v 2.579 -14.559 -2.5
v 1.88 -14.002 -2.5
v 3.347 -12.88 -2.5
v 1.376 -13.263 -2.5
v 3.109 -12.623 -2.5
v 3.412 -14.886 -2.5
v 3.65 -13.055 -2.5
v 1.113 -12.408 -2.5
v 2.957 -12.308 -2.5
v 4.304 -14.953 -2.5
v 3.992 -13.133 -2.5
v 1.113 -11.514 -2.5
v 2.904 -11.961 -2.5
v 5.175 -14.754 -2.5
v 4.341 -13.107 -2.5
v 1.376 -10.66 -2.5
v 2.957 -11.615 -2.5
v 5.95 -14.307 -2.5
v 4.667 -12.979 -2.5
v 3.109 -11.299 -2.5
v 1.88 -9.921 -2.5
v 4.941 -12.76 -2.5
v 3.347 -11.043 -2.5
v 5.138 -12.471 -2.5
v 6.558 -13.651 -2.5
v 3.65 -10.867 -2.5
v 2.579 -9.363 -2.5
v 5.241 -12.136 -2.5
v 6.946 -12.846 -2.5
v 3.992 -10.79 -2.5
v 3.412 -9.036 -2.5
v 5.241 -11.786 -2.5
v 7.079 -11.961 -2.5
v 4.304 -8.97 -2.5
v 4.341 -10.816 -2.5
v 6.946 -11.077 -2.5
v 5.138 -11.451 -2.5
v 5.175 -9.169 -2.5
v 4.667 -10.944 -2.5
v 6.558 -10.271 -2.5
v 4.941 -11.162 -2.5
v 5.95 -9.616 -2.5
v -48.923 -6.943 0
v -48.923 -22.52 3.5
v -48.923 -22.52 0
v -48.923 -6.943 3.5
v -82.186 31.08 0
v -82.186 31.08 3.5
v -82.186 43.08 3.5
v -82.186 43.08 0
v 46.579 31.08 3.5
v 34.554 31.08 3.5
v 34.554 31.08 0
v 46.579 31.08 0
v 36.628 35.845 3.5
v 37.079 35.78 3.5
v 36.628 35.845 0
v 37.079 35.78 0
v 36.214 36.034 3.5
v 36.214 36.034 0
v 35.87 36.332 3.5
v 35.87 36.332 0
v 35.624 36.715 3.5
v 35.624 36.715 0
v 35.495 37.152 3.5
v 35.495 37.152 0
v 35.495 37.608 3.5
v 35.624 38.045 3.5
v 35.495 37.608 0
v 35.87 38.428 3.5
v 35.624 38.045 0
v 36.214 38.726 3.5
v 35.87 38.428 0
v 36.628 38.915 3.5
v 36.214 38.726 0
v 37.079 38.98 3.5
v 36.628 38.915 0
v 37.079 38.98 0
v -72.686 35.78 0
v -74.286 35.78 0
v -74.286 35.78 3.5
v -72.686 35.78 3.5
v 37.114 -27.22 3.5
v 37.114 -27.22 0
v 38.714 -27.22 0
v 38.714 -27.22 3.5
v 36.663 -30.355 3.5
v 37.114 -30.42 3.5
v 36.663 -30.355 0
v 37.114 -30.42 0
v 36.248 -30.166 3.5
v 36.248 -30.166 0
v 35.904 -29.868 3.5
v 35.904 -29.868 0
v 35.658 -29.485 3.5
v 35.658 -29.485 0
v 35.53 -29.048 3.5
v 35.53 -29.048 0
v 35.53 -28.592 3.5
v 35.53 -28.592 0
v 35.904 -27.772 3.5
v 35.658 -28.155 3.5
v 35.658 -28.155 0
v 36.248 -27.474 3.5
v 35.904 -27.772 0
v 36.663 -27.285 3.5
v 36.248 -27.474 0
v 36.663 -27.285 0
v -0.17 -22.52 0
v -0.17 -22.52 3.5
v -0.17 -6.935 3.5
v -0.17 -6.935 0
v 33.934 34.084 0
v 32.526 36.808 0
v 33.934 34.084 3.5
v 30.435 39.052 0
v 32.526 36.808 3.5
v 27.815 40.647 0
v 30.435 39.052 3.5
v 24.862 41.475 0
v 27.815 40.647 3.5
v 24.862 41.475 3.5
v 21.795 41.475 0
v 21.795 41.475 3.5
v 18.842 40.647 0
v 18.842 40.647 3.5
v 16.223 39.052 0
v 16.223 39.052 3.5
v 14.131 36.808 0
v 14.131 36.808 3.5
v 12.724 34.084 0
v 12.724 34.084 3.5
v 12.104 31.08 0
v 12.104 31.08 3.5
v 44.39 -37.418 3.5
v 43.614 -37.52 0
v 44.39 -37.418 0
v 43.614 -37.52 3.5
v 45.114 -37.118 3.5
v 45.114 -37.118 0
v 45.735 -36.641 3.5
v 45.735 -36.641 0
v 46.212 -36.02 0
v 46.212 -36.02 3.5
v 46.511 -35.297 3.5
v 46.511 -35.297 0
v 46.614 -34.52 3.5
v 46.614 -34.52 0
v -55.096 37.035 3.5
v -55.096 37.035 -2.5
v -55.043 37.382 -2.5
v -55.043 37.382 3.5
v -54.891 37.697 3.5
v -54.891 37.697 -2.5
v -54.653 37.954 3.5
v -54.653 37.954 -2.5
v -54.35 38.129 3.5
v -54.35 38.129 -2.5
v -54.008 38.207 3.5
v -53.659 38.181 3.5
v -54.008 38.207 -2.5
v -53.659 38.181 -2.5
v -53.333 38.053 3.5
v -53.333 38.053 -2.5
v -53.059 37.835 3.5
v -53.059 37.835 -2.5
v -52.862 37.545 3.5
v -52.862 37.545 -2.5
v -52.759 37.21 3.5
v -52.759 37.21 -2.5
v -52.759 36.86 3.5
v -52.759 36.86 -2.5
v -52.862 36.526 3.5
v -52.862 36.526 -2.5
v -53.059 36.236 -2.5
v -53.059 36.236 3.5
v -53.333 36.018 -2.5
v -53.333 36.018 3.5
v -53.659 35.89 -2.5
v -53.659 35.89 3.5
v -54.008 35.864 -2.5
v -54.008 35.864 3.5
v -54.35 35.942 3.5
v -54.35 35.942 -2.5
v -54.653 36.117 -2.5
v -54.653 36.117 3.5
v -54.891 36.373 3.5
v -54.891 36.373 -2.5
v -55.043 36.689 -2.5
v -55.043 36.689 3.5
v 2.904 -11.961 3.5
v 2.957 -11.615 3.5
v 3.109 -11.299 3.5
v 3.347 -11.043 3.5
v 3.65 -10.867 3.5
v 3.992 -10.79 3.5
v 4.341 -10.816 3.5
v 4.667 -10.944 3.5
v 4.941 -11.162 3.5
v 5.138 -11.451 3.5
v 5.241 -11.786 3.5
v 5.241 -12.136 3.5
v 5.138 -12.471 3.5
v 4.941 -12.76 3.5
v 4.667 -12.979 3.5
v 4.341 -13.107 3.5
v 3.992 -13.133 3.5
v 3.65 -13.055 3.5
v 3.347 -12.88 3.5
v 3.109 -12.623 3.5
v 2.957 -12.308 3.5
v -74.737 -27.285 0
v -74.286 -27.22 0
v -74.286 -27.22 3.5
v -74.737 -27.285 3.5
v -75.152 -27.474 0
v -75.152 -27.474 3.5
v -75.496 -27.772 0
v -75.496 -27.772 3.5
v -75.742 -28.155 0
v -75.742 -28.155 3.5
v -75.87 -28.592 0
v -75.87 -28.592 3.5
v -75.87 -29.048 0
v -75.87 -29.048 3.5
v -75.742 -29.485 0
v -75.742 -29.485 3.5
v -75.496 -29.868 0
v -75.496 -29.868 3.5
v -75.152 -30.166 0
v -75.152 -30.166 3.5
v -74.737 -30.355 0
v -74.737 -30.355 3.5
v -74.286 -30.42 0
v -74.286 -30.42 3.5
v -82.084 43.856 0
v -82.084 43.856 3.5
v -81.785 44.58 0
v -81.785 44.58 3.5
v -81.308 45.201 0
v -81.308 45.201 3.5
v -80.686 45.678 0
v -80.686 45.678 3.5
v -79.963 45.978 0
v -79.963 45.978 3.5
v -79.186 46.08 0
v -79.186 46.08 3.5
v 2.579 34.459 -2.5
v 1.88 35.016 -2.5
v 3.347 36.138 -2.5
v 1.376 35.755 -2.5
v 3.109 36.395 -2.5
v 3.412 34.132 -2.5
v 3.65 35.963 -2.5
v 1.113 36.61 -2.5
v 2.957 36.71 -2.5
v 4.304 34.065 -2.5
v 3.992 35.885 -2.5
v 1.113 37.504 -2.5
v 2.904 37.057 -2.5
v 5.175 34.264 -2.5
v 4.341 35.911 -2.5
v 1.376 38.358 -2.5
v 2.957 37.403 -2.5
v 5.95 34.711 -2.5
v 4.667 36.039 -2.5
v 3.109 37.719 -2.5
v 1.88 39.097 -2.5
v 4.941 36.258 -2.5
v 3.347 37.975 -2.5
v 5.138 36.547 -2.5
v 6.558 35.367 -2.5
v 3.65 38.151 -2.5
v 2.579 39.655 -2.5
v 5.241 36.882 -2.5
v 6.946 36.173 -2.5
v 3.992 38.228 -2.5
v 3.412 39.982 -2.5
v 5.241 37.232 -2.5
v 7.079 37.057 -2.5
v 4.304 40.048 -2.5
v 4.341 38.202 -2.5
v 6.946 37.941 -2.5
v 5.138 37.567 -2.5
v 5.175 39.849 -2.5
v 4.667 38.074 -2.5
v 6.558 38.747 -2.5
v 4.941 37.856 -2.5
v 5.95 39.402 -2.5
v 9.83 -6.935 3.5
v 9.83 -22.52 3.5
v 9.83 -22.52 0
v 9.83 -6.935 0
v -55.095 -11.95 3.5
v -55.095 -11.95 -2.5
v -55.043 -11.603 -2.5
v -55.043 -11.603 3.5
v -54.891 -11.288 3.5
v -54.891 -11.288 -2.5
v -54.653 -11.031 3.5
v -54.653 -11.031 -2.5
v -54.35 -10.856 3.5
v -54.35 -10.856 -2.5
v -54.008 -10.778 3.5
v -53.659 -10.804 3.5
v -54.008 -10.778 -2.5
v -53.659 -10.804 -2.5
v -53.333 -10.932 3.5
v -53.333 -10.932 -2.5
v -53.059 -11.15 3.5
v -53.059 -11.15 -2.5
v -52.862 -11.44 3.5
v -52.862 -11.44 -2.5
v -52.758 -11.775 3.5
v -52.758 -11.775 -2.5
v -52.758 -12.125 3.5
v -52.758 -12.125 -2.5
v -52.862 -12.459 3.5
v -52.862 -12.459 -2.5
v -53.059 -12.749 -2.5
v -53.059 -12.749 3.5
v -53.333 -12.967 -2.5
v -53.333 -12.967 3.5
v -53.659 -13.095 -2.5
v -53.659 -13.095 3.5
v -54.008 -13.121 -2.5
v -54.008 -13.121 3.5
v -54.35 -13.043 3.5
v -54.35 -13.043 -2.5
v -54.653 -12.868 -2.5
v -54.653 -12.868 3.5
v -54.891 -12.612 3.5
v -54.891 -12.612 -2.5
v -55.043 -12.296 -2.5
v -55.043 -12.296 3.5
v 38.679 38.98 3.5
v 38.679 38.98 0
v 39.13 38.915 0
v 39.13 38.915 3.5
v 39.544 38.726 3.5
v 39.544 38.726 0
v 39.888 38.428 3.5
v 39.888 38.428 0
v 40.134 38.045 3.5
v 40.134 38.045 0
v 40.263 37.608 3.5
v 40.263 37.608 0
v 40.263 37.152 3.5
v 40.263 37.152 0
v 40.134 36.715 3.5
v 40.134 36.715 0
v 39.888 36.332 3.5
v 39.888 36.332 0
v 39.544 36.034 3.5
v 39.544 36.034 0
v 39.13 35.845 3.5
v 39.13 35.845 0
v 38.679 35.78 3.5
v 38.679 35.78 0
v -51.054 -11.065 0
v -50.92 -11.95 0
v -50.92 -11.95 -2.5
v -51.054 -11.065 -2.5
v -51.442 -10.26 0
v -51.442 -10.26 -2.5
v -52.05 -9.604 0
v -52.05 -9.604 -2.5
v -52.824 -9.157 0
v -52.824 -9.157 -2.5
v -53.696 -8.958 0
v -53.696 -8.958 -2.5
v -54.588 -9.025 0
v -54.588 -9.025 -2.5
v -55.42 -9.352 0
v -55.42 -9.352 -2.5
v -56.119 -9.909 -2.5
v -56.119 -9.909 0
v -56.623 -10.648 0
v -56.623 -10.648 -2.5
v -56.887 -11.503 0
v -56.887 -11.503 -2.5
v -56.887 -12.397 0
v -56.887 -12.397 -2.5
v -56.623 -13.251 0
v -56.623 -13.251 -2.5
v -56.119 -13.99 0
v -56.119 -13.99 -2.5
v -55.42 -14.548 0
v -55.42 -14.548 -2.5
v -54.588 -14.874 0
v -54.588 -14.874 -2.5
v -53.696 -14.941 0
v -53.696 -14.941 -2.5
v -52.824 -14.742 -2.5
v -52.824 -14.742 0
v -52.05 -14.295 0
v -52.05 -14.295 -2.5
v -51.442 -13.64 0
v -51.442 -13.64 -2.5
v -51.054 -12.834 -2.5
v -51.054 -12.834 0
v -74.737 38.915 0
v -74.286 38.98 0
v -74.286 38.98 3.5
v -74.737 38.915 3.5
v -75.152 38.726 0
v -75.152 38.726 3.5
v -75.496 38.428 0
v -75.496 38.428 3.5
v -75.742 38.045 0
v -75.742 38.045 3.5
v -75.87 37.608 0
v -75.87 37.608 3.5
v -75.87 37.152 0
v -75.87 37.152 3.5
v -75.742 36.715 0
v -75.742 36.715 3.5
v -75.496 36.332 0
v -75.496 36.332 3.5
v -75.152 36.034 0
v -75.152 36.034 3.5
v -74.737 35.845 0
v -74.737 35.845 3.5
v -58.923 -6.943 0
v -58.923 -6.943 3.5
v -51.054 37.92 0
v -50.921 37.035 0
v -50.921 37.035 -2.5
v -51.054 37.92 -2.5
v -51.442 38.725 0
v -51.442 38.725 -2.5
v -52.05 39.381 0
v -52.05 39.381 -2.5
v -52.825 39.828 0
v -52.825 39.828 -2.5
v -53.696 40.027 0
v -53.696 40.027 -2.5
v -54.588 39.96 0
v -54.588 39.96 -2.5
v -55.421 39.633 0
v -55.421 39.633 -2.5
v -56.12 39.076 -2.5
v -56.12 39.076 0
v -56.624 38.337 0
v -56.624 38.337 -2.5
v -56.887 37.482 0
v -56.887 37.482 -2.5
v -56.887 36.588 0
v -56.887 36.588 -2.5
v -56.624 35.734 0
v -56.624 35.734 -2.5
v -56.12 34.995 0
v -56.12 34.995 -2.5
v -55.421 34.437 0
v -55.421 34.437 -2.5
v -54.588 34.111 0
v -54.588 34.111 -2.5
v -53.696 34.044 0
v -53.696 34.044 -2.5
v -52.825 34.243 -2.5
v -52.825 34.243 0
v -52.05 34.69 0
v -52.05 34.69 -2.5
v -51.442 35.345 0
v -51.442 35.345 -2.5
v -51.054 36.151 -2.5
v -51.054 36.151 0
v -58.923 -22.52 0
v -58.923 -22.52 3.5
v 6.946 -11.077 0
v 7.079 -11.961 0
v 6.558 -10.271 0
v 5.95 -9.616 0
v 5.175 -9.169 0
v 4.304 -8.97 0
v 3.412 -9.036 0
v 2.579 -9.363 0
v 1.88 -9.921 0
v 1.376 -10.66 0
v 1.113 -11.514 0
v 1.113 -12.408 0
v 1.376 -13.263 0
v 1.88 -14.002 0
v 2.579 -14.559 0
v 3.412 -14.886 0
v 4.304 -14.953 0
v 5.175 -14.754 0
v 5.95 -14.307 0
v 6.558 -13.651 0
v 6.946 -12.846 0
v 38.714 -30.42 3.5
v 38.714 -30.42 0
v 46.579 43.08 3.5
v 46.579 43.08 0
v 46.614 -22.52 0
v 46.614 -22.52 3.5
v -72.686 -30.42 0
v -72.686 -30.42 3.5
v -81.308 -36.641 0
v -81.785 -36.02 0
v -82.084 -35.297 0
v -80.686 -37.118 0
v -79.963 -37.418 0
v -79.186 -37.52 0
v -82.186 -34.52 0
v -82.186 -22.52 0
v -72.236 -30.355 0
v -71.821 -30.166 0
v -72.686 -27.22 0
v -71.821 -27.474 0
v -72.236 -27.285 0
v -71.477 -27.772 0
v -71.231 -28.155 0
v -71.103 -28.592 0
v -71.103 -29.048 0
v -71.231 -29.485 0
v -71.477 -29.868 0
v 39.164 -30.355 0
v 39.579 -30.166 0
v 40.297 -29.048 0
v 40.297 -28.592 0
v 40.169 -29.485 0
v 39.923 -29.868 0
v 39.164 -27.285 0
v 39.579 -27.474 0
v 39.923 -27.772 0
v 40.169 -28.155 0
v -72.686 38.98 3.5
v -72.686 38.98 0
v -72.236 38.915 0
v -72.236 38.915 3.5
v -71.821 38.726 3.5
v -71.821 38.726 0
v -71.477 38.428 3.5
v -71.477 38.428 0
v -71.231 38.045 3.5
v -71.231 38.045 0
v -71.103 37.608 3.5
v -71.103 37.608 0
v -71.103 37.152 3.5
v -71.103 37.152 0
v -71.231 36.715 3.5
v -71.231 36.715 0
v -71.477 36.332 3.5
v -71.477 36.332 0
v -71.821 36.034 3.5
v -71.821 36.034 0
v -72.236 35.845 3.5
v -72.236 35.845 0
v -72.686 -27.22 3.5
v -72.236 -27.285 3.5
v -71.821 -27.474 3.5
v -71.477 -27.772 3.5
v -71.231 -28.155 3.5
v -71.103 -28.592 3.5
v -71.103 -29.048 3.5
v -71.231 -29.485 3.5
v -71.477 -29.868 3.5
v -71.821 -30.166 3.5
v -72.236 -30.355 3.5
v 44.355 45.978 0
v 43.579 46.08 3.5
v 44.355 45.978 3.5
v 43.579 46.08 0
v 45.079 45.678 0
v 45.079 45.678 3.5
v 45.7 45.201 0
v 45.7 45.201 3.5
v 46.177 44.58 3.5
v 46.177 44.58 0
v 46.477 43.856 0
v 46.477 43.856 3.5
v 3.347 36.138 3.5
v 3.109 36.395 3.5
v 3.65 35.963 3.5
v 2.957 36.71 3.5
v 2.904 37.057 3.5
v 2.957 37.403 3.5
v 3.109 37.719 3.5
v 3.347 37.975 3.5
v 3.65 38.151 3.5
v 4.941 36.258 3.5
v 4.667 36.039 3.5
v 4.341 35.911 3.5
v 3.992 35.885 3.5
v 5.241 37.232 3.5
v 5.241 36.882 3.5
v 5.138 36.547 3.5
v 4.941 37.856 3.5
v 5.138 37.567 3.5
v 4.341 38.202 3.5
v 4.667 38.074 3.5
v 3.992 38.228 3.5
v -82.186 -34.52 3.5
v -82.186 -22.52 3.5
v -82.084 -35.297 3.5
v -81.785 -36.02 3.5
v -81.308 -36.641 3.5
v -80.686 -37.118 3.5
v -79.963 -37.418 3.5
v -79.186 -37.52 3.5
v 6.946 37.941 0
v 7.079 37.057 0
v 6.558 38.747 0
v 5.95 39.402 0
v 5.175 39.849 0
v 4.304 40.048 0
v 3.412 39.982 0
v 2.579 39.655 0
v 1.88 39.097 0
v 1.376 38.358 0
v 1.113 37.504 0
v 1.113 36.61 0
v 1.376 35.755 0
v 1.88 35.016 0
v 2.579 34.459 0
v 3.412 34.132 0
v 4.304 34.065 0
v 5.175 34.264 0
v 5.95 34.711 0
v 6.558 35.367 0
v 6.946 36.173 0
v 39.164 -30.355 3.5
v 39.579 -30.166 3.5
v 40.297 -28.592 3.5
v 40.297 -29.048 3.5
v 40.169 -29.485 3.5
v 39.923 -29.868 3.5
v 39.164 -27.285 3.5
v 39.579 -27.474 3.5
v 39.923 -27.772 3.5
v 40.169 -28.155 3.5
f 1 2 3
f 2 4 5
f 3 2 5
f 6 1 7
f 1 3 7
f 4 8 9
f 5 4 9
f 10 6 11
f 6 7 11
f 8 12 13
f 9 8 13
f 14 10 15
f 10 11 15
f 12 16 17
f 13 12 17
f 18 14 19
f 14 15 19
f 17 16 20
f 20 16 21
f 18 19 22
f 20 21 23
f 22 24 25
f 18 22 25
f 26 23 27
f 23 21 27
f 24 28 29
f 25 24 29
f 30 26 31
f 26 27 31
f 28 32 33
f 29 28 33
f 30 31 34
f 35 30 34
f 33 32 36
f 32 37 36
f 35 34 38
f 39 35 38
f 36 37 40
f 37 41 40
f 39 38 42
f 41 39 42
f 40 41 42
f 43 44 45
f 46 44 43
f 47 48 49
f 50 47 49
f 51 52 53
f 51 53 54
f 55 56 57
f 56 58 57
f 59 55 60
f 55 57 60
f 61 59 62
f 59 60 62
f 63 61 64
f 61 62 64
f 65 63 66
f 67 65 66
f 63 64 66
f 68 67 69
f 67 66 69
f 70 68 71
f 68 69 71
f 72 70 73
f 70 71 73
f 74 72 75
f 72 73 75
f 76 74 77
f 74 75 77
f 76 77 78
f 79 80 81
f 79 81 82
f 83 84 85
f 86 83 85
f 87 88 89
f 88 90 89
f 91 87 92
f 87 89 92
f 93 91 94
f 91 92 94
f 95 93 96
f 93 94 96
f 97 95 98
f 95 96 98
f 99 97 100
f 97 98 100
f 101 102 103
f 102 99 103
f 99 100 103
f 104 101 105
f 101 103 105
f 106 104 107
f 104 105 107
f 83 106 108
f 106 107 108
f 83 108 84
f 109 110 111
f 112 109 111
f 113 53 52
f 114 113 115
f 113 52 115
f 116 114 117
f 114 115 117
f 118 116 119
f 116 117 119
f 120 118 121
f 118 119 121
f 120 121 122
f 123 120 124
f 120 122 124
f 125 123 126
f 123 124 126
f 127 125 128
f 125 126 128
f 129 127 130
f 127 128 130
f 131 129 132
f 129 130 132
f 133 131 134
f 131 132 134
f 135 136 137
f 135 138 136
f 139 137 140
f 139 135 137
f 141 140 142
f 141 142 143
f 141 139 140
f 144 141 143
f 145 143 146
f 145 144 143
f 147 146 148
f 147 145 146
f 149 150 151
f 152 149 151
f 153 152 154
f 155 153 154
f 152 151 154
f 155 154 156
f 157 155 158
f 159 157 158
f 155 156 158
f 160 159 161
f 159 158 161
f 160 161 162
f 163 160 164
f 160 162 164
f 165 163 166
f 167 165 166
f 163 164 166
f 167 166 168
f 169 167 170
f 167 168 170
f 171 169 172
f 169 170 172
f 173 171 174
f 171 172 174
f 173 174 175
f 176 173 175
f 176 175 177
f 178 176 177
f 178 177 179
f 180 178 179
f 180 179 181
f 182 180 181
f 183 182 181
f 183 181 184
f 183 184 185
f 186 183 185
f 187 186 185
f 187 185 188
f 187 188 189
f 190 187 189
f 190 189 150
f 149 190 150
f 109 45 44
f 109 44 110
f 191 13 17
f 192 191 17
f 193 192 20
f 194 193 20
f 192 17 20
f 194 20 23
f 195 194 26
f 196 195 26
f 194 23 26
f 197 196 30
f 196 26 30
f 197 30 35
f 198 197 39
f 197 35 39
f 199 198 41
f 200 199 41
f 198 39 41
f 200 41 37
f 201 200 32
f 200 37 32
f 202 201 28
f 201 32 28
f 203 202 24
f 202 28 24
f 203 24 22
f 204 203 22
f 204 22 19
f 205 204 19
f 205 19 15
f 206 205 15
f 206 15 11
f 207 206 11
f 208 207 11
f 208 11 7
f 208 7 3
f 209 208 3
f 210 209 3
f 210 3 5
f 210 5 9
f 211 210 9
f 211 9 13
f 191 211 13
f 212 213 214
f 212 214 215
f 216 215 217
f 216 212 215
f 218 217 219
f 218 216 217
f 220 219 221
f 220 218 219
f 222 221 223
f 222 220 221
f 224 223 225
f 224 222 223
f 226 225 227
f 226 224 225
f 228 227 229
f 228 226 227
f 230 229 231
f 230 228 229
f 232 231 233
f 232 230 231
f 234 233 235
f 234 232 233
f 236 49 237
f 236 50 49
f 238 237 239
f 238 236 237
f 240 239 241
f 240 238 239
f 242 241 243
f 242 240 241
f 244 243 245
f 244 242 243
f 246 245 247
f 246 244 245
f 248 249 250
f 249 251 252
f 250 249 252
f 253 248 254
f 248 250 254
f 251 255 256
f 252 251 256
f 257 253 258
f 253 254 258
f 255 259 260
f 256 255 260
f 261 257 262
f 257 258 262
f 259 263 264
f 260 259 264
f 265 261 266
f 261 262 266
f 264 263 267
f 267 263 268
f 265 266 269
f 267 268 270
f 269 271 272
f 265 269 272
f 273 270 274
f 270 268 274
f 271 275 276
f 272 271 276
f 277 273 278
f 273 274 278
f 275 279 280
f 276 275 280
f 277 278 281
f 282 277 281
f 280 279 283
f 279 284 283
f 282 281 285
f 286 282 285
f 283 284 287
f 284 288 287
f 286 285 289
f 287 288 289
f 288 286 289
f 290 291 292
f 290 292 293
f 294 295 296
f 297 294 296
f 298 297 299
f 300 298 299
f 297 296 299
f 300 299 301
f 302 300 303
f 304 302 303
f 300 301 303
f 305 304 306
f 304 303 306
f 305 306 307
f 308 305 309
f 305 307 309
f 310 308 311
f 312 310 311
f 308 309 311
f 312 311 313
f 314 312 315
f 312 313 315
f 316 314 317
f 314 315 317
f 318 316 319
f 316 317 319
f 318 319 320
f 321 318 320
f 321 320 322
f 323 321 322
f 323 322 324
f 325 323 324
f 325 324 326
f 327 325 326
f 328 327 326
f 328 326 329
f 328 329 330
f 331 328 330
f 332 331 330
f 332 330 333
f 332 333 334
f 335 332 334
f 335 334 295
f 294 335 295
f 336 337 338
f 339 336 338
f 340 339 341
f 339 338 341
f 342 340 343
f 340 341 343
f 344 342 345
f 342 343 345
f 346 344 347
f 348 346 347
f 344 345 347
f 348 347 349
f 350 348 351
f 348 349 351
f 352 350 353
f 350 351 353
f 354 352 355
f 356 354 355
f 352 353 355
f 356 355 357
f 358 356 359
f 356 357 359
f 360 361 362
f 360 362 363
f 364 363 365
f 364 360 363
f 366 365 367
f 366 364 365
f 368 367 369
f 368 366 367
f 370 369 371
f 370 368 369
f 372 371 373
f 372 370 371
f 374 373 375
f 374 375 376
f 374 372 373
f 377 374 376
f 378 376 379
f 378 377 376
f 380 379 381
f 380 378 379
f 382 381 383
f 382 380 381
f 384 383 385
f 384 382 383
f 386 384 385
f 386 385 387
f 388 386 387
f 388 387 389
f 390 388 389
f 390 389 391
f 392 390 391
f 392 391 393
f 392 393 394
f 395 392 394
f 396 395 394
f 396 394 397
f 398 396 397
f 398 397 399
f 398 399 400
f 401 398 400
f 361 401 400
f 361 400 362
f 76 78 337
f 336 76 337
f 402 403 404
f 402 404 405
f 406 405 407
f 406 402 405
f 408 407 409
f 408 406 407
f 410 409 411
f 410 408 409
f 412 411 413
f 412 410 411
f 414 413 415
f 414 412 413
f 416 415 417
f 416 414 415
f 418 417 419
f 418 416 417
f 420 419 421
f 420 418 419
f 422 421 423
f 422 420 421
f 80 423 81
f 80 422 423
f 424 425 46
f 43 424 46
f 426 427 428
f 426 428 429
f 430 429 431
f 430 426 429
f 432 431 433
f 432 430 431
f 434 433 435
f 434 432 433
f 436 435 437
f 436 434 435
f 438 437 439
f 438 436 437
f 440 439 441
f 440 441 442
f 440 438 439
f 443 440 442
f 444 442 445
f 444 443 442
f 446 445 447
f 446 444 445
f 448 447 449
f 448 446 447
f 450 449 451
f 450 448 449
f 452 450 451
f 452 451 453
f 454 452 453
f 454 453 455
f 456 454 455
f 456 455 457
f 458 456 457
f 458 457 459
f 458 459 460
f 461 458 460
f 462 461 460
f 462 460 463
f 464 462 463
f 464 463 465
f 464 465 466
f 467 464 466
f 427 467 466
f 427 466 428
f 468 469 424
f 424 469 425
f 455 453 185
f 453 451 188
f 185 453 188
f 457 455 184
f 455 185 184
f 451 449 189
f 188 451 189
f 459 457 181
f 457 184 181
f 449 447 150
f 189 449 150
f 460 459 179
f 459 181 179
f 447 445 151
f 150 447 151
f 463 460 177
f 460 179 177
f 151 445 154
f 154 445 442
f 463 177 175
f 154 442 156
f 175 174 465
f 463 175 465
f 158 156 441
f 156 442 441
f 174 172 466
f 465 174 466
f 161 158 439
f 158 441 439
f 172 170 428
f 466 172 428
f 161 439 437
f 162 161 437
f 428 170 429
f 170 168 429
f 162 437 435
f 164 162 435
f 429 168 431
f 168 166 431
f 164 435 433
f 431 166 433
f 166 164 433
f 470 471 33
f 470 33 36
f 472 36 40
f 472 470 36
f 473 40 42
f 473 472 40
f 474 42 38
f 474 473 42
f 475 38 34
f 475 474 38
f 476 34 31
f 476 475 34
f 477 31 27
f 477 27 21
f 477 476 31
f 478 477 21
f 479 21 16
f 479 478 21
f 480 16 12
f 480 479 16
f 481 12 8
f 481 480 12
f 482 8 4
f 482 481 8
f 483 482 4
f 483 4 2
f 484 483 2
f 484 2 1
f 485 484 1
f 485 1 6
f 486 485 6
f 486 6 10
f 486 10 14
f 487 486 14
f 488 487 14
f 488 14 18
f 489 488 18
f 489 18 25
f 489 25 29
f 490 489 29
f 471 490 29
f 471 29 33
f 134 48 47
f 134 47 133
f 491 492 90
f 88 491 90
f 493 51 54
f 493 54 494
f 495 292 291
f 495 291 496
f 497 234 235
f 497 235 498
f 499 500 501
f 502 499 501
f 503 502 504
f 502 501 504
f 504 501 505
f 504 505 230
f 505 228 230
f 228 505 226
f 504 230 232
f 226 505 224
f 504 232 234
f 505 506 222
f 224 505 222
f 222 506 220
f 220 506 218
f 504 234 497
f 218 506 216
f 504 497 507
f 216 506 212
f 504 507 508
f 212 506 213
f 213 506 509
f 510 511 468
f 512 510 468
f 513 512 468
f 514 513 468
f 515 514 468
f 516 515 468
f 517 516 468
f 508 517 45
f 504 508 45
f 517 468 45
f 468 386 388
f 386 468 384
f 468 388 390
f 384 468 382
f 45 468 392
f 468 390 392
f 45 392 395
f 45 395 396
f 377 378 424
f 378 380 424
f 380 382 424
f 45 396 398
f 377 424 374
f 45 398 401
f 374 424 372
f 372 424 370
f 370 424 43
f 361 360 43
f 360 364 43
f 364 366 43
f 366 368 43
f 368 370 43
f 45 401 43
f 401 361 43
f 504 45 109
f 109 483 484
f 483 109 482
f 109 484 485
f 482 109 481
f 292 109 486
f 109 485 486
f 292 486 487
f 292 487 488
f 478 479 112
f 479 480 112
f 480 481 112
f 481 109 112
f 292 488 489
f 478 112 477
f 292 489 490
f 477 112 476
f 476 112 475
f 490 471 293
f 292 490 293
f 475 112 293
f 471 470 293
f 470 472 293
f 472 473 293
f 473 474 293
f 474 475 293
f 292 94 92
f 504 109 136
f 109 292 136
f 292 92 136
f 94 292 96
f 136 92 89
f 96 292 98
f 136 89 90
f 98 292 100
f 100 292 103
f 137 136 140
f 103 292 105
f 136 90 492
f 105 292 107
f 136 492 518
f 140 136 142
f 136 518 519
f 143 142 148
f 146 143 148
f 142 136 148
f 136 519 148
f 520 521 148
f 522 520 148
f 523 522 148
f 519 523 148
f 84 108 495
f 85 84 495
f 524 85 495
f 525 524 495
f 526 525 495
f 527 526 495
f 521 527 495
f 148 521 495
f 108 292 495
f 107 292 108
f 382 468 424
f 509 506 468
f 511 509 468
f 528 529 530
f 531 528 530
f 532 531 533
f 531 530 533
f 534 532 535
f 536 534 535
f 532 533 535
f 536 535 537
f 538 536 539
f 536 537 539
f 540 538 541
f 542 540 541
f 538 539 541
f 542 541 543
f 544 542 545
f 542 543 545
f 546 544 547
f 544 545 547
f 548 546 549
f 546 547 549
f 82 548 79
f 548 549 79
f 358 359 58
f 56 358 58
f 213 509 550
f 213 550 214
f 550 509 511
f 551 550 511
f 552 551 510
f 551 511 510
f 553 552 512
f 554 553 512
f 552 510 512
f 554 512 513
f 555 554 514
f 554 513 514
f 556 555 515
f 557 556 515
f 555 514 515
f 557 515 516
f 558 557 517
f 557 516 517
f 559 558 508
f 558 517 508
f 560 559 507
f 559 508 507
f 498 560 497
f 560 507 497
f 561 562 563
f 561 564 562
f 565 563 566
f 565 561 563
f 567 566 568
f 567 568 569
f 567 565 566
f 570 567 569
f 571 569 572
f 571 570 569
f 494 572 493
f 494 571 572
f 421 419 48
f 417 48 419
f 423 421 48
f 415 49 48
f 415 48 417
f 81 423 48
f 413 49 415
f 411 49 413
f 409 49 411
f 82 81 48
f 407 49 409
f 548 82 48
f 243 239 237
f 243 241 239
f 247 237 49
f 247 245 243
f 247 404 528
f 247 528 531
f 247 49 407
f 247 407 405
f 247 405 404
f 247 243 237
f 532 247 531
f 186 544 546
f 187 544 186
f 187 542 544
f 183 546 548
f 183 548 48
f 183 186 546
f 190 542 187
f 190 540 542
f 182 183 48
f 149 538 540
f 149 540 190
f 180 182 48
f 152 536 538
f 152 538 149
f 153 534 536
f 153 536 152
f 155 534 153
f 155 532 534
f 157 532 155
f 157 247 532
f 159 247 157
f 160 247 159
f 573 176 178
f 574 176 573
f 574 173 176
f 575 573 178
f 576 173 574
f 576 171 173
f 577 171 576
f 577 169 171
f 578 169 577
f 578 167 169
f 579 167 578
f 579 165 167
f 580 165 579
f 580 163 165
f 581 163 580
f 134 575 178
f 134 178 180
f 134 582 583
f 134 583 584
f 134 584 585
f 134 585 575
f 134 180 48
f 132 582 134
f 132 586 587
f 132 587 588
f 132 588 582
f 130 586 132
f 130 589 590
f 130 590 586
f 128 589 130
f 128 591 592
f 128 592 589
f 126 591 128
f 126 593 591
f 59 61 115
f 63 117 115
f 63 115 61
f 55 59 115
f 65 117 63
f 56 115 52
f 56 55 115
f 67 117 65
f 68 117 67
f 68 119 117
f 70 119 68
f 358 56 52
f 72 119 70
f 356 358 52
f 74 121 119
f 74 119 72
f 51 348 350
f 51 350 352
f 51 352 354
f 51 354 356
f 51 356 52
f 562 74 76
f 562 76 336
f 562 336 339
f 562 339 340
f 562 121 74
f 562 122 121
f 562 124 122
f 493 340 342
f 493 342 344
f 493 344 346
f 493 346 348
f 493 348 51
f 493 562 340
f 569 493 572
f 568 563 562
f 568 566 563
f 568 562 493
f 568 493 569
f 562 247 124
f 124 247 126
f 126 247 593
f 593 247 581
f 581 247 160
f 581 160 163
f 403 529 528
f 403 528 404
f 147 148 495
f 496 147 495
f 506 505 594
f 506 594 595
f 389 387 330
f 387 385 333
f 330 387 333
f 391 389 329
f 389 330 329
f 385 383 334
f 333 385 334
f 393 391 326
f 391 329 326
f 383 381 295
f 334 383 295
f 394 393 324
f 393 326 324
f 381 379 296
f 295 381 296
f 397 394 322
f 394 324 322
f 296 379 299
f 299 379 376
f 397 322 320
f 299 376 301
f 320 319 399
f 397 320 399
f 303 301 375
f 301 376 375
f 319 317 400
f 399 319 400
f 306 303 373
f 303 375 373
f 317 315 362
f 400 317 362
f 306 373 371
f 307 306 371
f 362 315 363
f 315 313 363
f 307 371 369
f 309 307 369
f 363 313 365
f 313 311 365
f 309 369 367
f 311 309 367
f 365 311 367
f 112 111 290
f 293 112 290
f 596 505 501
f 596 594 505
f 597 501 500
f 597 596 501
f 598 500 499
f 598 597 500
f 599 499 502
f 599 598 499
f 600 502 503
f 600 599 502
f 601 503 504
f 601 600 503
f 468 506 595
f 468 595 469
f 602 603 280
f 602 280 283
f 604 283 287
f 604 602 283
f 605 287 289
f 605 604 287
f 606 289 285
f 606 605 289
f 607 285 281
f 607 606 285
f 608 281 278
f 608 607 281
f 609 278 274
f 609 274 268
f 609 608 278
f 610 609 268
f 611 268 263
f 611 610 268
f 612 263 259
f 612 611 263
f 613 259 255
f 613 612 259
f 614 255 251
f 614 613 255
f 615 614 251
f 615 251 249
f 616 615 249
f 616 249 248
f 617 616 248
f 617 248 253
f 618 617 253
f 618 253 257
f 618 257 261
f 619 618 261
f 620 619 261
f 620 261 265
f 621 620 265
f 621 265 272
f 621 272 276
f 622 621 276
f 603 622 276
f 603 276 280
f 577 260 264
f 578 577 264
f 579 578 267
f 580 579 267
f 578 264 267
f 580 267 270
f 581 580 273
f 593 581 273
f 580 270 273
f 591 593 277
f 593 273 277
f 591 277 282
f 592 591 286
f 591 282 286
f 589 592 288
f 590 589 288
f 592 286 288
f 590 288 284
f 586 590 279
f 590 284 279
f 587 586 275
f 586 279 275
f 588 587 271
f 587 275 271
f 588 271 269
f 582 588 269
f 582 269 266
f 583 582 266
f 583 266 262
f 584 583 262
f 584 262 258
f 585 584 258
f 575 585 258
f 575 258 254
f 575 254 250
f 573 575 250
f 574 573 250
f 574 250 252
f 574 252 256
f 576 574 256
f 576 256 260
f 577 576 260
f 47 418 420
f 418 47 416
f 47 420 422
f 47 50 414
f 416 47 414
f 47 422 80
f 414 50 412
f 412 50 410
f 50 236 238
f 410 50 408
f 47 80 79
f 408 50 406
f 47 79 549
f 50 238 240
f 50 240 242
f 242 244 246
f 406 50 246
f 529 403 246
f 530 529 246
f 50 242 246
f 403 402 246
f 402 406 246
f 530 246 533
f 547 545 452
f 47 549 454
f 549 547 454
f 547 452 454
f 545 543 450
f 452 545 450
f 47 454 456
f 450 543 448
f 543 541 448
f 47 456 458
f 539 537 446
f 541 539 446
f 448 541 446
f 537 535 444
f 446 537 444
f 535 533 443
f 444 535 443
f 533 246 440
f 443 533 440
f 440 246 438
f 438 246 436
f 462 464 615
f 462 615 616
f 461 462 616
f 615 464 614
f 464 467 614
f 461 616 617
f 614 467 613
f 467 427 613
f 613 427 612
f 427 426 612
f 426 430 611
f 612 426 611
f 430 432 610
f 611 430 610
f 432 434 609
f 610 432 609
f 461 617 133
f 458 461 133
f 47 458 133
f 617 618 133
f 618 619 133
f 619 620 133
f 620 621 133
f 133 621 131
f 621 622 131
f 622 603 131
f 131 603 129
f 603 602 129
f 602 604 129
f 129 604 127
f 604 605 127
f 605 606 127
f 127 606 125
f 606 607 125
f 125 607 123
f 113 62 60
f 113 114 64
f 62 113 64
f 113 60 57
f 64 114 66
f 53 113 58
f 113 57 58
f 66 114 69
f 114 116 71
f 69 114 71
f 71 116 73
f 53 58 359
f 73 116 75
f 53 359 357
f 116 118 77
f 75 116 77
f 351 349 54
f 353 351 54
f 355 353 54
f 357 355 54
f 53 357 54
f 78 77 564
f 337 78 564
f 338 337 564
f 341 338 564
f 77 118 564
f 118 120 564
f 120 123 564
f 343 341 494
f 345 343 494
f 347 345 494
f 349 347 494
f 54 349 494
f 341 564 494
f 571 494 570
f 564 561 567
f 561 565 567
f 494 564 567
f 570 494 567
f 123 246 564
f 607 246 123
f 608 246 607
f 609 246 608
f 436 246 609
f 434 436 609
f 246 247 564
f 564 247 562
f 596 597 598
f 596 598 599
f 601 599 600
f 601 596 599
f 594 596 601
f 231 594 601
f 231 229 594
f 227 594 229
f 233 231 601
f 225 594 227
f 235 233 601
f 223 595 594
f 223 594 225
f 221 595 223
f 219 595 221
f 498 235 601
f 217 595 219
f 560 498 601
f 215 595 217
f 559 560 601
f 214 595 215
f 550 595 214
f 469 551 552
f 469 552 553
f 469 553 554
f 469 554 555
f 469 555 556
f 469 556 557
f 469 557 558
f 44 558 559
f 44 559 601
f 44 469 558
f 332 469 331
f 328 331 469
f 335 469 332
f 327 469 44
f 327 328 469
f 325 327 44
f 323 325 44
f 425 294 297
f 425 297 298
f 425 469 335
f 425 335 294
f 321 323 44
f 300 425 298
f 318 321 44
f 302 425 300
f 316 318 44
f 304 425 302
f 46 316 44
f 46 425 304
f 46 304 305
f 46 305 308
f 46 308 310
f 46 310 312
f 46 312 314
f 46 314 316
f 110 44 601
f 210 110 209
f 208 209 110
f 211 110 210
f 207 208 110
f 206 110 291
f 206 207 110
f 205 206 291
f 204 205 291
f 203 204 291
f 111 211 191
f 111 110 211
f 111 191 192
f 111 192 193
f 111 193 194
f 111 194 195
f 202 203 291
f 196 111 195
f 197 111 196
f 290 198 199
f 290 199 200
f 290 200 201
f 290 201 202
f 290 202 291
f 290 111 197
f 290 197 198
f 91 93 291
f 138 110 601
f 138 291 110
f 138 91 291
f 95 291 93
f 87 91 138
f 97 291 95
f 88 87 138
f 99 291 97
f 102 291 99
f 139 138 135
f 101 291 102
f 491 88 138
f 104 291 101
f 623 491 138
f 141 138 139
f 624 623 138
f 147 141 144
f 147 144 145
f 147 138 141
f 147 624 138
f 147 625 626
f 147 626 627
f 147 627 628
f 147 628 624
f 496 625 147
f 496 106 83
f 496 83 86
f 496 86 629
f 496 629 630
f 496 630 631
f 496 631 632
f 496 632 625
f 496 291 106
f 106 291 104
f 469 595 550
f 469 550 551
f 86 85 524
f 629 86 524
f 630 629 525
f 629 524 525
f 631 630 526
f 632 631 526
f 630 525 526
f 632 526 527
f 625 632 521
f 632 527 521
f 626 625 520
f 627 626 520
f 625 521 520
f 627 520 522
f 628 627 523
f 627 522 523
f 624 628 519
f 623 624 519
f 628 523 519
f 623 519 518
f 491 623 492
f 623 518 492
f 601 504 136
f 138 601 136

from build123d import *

# Parameters (mm, degrees)
SZKIC1_W                    = 128.8
SZKIC1_H                    = 15
DODANIE_WYCI_GNI_CIE1_DEPTH = 3.5
SZKIC2_W                    = 128.765393654
SZKIC2_H                    = 15
DODANIE_WYCI_GNI_CIE2_DEPTH = 3.5
SZKIC3_R                    = 1.6
WYTNIJ_WYCI_GNI_CIE1_DEPTH  = 95.287994009
SZKIC4_R                    = 11.25
WYTNIJ_WYCI_GNI_CIE2_DEPTH  = 10
SZKIC5_R                    = 3
DODANIE_WYCI_GNI_CIE3_DEPTH = 6
ZAOKR_GLENIE1_R             = 3
ZAOKR_GLENIE2_R             = 3
ZAOKR_GLENIE3_R             = 3
ZAOKR_GLENIE4_R             = 3
SZKIC7_W                    = 10
SZKIC7_H                    = 21.706763169
SZKIC7_H_2                  = 19.767533865
DODANIE_WYCI_GNI_CIE4_DEPTH = 3.5
SZKIC8_R                    = 1.175
WYTNIJ_WYCI_GNI_CIE4_DEPTH  = 95.413853932
WYTNIJ_WYCI_GNI_CIE5_DEPTH  = 95.287994009


with BuildPart() as part:
    # Szkic1 → Dodanie-wyciągnięcie1 (new body)
    with BuildSketch(Plane.XY):
        with Locations((-17.786479808, -30.020087336)):
            Rectangle(SZKIC1_W, SZKIC1_H)
    extrude(amount=DODANIE_WYCI_GNI_CIE1_DEPTH)


with BuildPart() as body_2:
    # Szkic2 → Dodanie-wyciągnięcie2 (new body)
    with BuildSketch(Plane.XY.offset(3.5)):
        with Locations((-17.803782981, 38.579912664)):
            Rectangle(SZKIC2_W, SZKIC2_H)
    extrude(amount=-DODANIE_WYCI_GNI_CIE2_DEPTH)


with BuildPart() as wytnij_wyci_gni_cie1_tool:
    # Szkic3 → Wytnij-wyciągnięcie1 (new, through all)
    with BuildSketch(Plane(origin=(0, 0, 0), x_dir=(-1, 0, 0), z_dir=(0, 0, -1))):
        with Locations((-37.113520192, -28.820087336)):
            Circle(SZKIC3_R)
        with Locations((-37.078913846, 37.379912664)):
            Circle(SZKIC3_R)
        with Locations((72.686479808, -28.820087336)):
            Circle(SZKIC3_R)
        with Locations((72.686479808, 37.379912664)):
            Circle(SZKIC3_R)
    extrude(amount=-WYTNIJ_WYCI_GNI_CIE1_DEPTH)


with BuildPart() as part_1:
    add(part.part)

    # Wytnij-wyciągnięcie1: cut by wytnij_wyci_gni_cie1_tool
    add(wytnij_wyci_gni_cie1_tool.part, mode=Mode.SUBTRACT)

    # Zaokrąglenie1
    zaokr_glenie1_edges = [part_1.edges().sort_by_distance(p)[0] for p in [
        (-82.186479808, -37.520087336, 1.75),
    ]]
    fillet(zaokr_glenie1_edges, radius=ZAOKR_GLENIE1_R)

    # Zaokrąglenie4
    zaokr_glenie4_edges = [part_1.edges().sort_by_distance(p)[0] for p in [
        (46.613520192, -37.520087336, 1.75),
    ]]
    fillet(zaokr_glenie4_edges, radius=ZAOKR_GLENIE4_R)



with BuildPart() as body_2_1:
    add(body_2.part)

    # Wytnij-wyciągnięcie1: cut by wytnij_wyci_gni_cie1_tool
    add(wytnij_wyci_gni_cie1_tool.part, mode=Mode.SUBTRACT)

    # Szkic4 → Wytnij-wyciągnięcie2 (cut)
    with BuildSketch(Plane.XY.offset(3.5)):
        with Locations((23.328913846, 30.329912664)):
            Circle(SZKIC4_R)
    extrude(amount=-WYTNIJ_WYCI_GNI_CIE2_DEPTH, mode=Mode.SUBTRACT)

    # Szkic5 → Dodanie-wyciągnięcie3 (add)
    with BuildSketch(Plane.XY.offset(3.5)):
        with Locations((4.079383089, 37.056776562)):
            Circle(SZKIC5_R)
        with Locations((-53.920616911, 37.035372315)):
            Circle(SZKIC5_R)
        with Locations((-53.920332778, -11.949643617)):
            Circle(SZKIC5_R)
        with Locations((4.079381236, -11.961248969)):
            Circle(SZKIC5_R)
    extrude(amount=-DODANIE_WYCI_GNI_CIE3_DEPTH)


with BuildPart() as dodanie_wyci_gni_cie3_piece_1:
    # of the separate pieces the step leaves, piece 1, a body of its own (dodanie_wyci_gni_cie3_pieces)
    add(body_2_1.part.solids().sort_by_distance((-82.186479808, 31.079912664, 3.5))[0])

    # Zaokrąglenie2
    zaokr_glenie2_edges = [dodanie_wyci_gni_cie3_piece_1.edges().sort_by_distance(p)[0] for p in [
        (-82.186479808, 46.079912664, 1.75),
    ]]
    fillet(zaokr_glenie2_edges, radius=ZAOKR_GLENIE2_R)

    # Zaokrąglenie3
    zaokr_glenie3_edges = [dodanie_wyci_gni_cie3_piece_1.edges().sort_by_distance(p)[0] for p in [
        (46.578913846, 46.079912664, 1.75),
    ]]
    fillet(zaokr_glenie3_edges, radius=ZAOKR_GLENIE3_R)


with BuildPart() as dodanie_wyci_gni_cie3_piece_2:
    # of the separate pieces the step leaves, piece 2, a body of its own (dodanie_wyci_gni_cie3_pieces)
    add(body_2_1.part.solids().sort_by_distance((-50.920332778, -11.949643617, 3.5))[0])


with BuildPart() as dodanie_wyci_gni_cie3_piece_3:
    # of the separate pieces the step leaves, piece 3, a body of its own (dodanie_wyci_gni_cie3_pieces)
    add(body_2_1.part.solids().sort_by_distance((7.079381236, -11.961248969, 3.5))[0])


with BuildPart() as part_2:
    add(part_1.part)

    add(dodanie_wyci_gni_cie3_piece_2.part)  # Dodanie-wyciągnięcie4 merges Dodanie-wyciągnięcie3 piece 2

    add(dodanie_wyci_gni_cie3_piece_3.part)  # Dodanie-wyciągnięcie4 merges Dodanie-wyciągnięcie3 piece 3
    # Szkic7 → Dodanie-wyciągnięcie4 (add)
    with BuildSketch(Plane.XY.offset(3.5)):
        with Locations((4.830175177, -17.788773793)):
            Rectangle(SZKIC7_W, SZKIC7_H)
        with Locations((-53.922751923, -16.82630805)):
            Rectangle(SZKIC7_W, SZKIC7_H_2)
    extrude(amount=-DODANIE_WYCI_GNI_CIE4_DEPTH)


with BuildPart() as wytnij_wyci_gni_cie4_tool:
    # Szkic8 → Wytnij-wyciągnięcie4 (new, through all)
    with BuildSketch(Plane(origin=(0, 0, -2.5), x_dir=(-1, 0, 0), z_dir=(0, 0, -1))):
        with Locations((-4.079381236, -11.961248969)):
            Circle(SZKIC8_R)
        with Locations((53.920332778, -11.949643617)):
            Circle(SZKIC8_R)
        with Locations((53.920616911, 37.035372315)):
            Circle(SZKIC8_R)
        with Locations((-4.079383089, 37.056776562)):
            Circle(SZKIC8_R)
    extrude(amount=-WYTNIJ_WYCI_GNI_CIE4_DEPTH)


with BuildPart() as part_3:
    add(part_2.part)

    # Wytnij-wyciągnięcie4: cut by wytnij_wyci_gni_cie4_tool
    add(wytnij_wyci_gni_cie4_tool.part, mode=Mode.SUBTRACT)


with BuildPart() as dodanie_wyci_gni_cie3_piece_1_1:
    add(dodanie_wyci_gni_cie3_piece_1.part)

    # Wytnij-wyciągnięcie4: cut by wytnij_wyci_gni_cie4_tool
    add(wytnij_wyci_gni_cie4_tool.part, mode=Mode.SUBTRACT)


with BuildPart() as wytnij_wyci_gni_cie5_tool:
    # Szkic9 → Wytnij-wyciągnięcie5 (new, through all)
    with BuildSketch(Plane(origin=(0, 0, 0), x_dir=(-1, 0, 0), z_dir=(0, 0, -1))):
        with BuildLine():
            Line((74.286479808, 35.779912664), (72.686479808, 35.779912664))
            Line((72.686479808, 35.779912664), (72.686479808, 38.979912664))
            Line((72.686479808, 38.979912664), (74.286479808, 38.979912664))
            ThreePointArc((74.286479808, 38.979912664), (75.886479808, 37.379912664), (74.286479808, 35.779912664))
        make_face()
        with BuildLine():
            Line((-38.678913846, 35.779912664), (-37.078913846, 35.779912664))
            Line((-37.078913846, 35.779912664), (-37.078913846, 38.979912664))
            Line((-37.078913846, 38.979912664), (-38.678913846, 38.979912664))
            ThreePointArc((-38.678913846, 38.979912664), (-40.278913846, 37.379912664), (-38.678913846, 35.779912664))
        make_face()
        with BuildLine():
            Line((-38.713520192, -30.420087336), (-37.113520192, -30.420087336))
            Line((-37.113520192, -30.420087336), (-37.113520192, -27.220087336))
            Line((-37.113520192, -27.220087336), (-38.713520192, -27.220087336))
            ThreePointArc((-38.713520192, -27.220087336), (-40.313520192, -28.820087336), (-38.713520192, -30.420087336))
        make_face()
        with BuildLine():
            Line((74.286479808, -30.420087336), (72.686479808, -30.420087336))
            Line((72.686479808, -30.420087336), (72.686479808, -27.220087336))
            Line((72.686479808, -27.220087336), (74.286479808, -27.220087336))
            ThreePointArc((74.286479808, -27.220087336), (75.886479808, -28.820087336), (74.286479808, -30.420087336))
        make_face()
    extrude(amount=-WYTNIJ_WYCI_GNI_CIE5_DEPTH)


with BuildPart() as part_4:
    add(part_3.part)

    # Wytnij-wyciągnięcie5: cut by wytnij_wyci_gni_cie5_tool
    add(wytnij_wyci_gni_cie5_tool.part, mode=Mode.SUBTRACT)


with BuildPart() as dodanie_wyci_gni_cie3_piece_1_2:
    add(dodanie_wyci_gni_cie3_piece_1_1.part)

    # Wytnij-wyciągnięcie5: cut by wytnij_wyci_gni_cie5_tool
    add(wytnij_wyci_gni_cie5_tool.part, mode=Mode.SUBTRACT)


solid = Compound([part_4.part, dodanie_wyci_gni_cie3_piece_1_2.part])
